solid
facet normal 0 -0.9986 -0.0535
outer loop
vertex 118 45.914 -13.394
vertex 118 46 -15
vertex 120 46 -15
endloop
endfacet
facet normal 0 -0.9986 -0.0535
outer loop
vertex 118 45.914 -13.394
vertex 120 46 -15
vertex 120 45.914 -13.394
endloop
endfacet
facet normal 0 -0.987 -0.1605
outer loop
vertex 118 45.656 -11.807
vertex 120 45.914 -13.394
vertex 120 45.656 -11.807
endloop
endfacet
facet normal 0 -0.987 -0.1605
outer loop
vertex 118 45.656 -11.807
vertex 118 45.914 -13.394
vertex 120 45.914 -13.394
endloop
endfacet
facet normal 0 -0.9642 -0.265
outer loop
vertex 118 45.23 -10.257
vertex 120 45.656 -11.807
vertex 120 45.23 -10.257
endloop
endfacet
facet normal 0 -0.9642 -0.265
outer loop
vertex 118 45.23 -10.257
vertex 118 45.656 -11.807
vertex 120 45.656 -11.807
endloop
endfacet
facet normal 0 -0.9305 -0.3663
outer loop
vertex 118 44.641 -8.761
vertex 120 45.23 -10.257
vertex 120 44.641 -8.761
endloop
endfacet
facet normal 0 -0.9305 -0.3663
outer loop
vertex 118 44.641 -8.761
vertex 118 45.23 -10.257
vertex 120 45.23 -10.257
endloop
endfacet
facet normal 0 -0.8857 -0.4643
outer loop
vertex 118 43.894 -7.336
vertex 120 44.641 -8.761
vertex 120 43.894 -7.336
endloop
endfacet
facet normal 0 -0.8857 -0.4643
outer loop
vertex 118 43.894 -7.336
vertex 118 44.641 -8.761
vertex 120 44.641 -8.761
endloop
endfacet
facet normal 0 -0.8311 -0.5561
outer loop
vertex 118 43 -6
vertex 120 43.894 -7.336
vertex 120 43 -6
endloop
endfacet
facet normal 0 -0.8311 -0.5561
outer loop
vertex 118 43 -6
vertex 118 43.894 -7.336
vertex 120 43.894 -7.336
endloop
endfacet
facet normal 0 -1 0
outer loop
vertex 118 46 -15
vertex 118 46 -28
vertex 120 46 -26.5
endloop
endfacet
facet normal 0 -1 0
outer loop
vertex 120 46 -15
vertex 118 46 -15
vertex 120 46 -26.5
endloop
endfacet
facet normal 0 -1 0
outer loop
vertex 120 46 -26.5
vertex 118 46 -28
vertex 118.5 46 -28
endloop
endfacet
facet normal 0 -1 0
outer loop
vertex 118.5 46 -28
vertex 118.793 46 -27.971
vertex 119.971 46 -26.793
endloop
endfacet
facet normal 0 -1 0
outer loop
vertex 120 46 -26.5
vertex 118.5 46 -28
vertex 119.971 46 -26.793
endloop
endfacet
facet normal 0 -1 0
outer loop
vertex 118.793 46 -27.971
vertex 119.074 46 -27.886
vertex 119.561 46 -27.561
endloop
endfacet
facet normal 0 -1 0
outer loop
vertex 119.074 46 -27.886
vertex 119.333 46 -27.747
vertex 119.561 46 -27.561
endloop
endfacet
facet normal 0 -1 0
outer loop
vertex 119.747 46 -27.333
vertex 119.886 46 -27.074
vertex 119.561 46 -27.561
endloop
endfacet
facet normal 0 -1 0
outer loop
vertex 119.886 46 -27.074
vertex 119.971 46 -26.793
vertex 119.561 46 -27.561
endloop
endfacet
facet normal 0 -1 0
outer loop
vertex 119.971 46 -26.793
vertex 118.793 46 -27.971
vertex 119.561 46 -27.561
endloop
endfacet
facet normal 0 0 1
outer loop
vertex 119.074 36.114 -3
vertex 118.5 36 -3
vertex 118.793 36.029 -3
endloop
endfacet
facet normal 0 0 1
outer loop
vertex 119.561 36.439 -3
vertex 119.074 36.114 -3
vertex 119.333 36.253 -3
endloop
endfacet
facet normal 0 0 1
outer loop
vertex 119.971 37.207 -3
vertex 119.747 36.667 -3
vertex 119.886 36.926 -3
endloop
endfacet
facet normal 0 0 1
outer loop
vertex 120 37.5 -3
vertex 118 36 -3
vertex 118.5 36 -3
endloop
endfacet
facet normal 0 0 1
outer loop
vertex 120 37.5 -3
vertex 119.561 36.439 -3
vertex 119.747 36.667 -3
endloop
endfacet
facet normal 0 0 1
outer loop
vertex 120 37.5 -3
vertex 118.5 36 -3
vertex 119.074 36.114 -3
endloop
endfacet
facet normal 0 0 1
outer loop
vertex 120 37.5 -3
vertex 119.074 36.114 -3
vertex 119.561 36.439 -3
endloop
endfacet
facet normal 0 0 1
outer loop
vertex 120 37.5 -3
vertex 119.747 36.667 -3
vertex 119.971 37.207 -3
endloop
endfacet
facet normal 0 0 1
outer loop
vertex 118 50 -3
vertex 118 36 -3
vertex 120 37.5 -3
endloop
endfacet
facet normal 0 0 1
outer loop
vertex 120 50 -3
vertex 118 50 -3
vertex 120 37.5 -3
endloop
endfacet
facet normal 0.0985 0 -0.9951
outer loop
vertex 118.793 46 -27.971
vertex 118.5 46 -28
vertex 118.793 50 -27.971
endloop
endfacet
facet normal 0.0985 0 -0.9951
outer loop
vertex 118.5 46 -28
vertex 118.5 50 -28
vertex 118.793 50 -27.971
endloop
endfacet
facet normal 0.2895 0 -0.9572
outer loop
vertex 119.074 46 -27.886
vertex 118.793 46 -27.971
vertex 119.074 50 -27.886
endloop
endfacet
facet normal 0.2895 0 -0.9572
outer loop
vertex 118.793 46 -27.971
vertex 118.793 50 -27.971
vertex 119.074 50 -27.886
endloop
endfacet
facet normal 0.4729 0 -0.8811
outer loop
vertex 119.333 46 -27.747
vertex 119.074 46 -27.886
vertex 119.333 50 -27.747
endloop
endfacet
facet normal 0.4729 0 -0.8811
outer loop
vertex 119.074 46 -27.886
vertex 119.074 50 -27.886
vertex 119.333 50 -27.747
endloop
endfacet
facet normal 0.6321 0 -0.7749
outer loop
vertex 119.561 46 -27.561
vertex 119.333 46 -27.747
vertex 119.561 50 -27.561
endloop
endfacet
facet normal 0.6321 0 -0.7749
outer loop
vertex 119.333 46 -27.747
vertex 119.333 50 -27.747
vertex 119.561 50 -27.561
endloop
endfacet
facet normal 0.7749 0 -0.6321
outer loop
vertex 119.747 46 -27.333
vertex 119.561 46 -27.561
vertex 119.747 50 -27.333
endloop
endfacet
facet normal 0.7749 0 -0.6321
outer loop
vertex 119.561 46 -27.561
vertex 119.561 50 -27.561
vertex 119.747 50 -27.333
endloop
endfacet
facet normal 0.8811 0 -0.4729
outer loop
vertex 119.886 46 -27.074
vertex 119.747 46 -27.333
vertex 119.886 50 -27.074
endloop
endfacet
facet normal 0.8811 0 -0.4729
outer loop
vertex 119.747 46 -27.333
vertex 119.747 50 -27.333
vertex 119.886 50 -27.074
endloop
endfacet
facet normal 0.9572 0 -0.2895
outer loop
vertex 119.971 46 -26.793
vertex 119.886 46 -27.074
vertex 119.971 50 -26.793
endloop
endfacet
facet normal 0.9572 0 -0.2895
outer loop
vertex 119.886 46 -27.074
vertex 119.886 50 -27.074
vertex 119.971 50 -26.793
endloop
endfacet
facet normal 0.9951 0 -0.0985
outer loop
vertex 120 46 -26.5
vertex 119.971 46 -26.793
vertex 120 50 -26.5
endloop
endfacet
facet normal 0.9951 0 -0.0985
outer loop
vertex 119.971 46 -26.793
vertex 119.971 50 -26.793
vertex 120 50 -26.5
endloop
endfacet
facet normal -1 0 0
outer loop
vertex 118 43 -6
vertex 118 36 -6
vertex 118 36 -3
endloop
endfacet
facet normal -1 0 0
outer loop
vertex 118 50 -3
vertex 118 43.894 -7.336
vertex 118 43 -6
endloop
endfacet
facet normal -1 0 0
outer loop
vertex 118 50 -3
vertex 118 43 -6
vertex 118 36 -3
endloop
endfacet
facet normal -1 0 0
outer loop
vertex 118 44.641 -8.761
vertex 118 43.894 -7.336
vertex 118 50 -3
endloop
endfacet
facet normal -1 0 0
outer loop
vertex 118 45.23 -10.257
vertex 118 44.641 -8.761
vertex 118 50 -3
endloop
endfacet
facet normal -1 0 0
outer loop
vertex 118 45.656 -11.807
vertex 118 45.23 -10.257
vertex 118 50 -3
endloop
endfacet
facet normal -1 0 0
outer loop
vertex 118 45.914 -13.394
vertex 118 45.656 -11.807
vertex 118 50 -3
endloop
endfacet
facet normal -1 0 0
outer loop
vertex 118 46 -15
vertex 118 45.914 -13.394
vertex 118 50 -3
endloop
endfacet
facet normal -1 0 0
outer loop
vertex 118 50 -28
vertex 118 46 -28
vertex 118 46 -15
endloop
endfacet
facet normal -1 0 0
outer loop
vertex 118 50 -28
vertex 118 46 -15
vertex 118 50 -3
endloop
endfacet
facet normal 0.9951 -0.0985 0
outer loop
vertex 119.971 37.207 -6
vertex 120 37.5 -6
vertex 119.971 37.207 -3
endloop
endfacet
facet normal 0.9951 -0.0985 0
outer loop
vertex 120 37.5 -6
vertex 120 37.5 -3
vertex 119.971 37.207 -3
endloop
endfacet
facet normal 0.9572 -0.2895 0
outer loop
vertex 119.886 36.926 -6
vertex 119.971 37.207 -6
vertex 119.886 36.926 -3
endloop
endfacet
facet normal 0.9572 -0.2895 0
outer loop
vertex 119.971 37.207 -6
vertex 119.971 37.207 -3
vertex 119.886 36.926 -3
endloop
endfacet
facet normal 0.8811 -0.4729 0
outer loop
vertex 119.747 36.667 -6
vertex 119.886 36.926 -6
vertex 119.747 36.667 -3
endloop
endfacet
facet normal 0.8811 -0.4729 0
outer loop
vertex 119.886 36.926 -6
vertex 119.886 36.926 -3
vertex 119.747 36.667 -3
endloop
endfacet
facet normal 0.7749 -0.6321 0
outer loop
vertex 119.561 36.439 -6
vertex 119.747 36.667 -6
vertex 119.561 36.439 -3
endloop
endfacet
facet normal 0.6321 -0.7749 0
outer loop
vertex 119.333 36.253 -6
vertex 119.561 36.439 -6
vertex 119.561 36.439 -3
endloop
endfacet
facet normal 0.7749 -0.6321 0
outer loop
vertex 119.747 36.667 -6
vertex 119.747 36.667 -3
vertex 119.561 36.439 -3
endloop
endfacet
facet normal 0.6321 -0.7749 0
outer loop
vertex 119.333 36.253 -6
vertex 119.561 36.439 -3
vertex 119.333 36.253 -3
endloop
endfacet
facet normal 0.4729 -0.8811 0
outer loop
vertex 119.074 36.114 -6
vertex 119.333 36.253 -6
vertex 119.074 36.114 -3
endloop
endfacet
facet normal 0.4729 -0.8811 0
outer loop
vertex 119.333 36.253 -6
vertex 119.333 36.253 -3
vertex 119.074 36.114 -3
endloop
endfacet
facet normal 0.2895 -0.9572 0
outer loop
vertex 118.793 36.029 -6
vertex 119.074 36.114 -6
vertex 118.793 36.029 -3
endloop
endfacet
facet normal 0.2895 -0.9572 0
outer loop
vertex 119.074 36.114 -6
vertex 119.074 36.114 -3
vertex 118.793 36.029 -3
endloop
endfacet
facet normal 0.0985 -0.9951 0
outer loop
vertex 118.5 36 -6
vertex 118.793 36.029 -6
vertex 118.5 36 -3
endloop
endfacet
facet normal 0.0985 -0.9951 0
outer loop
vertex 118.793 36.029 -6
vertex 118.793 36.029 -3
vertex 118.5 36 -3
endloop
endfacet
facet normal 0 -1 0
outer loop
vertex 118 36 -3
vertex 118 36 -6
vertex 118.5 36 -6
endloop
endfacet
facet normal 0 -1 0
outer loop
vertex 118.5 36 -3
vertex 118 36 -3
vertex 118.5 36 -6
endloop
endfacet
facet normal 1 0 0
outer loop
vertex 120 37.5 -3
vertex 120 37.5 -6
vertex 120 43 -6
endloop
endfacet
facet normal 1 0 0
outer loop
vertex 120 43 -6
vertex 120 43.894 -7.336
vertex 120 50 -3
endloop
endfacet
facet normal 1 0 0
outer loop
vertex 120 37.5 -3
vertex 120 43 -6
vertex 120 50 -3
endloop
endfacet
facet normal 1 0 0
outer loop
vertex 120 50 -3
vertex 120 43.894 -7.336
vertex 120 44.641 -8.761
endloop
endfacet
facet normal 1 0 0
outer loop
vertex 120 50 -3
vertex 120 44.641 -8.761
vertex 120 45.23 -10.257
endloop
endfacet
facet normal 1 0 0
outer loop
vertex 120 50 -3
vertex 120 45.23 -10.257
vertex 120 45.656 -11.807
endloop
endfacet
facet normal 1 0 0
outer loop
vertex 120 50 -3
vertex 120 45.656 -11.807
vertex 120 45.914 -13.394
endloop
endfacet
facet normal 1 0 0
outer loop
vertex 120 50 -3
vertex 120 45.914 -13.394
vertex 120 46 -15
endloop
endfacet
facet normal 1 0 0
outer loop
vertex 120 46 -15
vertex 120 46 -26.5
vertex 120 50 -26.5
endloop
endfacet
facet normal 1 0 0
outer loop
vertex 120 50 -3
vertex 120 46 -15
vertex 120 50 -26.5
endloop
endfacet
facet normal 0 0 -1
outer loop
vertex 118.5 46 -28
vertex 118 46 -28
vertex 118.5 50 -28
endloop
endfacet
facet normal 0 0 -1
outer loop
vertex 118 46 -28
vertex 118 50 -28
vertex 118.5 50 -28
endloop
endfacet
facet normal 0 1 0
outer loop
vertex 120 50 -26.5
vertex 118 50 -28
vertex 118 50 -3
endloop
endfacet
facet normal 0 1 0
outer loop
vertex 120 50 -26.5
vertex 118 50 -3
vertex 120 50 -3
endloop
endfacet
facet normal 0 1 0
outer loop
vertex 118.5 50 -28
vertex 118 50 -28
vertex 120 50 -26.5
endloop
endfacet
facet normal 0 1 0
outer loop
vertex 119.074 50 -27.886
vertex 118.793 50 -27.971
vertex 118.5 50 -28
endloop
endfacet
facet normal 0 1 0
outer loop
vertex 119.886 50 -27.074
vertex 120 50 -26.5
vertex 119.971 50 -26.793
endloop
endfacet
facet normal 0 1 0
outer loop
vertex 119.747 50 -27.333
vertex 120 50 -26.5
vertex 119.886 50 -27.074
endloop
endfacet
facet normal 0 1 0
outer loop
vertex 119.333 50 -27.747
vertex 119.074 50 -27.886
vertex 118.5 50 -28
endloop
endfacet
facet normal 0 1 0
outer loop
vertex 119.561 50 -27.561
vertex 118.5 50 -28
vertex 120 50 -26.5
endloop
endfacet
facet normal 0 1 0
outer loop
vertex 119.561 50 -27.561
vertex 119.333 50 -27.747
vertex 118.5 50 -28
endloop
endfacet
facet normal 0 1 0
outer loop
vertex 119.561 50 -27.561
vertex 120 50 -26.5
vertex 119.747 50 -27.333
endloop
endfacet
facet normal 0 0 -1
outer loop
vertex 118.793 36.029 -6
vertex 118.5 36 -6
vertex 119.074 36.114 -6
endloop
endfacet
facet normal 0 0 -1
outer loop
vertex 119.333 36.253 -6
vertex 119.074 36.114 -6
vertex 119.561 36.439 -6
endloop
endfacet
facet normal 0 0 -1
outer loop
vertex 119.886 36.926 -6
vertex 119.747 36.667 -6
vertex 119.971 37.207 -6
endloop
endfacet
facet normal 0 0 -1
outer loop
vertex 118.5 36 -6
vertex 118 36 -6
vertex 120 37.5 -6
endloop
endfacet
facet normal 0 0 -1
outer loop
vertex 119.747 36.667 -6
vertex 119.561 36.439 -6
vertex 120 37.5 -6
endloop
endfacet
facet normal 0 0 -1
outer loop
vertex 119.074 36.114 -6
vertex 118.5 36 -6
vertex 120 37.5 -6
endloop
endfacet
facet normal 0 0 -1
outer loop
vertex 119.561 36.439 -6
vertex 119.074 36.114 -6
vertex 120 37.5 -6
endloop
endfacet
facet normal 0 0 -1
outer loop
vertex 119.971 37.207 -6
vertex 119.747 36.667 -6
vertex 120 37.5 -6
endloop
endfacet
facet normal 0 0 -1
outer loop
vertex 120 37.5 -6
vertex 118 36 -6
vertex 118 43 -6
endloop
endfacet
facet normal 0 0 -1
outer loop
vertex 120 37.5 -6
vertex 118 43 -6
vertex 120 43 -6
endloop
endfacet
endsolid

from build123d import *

# Parameters (mm, degrees)
CYLINDER098_R     = 15
CYLINDER098_DEPTH = 4
BOX249_W          = 2
BOX249_H          = 10
BOX249_DEPTH      = 9
BOX250_W          = 2
BOX250_H          = 4
BOX250_DEPTH      = 13
BOX251_W          = 2
BOX251_H          = 14
BOX251_DEPTH      = 3
FILLET064_R       = 1.5


with BuildPart() as cylinder178:
    # Cylinder098 → Cylinder098 (new body)
    with BuildSketch(Plane(origin=(117, 31, -15), x_dir=(0, 0, -1), z_dir=(1, 0, 0))):
        Circle(CYLINDER098_R)
    extrude(amount=CYLINDER098_DEPTH)


with BuildPart() as cut130:
    # Box249 → Box249 (new body)
    with BuildSketch(Plane(origin=(118, 40, -15), x_dir=(1, 0, 0), z_dir=(0, 0, 1))):
        with Locations((1, 5)):
            Rectangle(BOX249_W, BOX249_H)
    extrude(amount=BOX249_DEPTH)

    # Cut130: cut Cylinder178
    add(cylinder178.part, mode=Mode.SUBTRACT)


with BuildPart() as cube238:
    # Box250 → Box250 (new body)
    with BuildSketch(Plane(origin=(118, 46, -28), x_dir=(1, 0, 0), z_dir=(0, 0, 1))):
        with Locations((1, 2)):
            Rectangle(BOX250_W, BOX250_H)
    extrude(amount=BOX250_DEPTH)


with BuildPart() as fillet064:
    # Box251 → Box251 (new body)
    with BuildSketch(Plane(origin=(118, 36, -6), x_dir=(1, 0, 0), z_dir=(0, 0, 1))):
        with Locations((1, 7)):
            Rectangle(BOX251_W, BOX251_H)
    extrude(amount=BOX251_DEPTH)

    # Fusion078: union Cut130, Cube238
    add(cut130.part)
    add(cube238.part)

    # Fillet064
    fillet064_edges = [fillet064.edges().sort_by_distance(p)[0] for p in [
        (120, 36, -4.5),
        (120, 48, -28),
    ]]
    fillet(fillet064_edges, radius=FILLET064_R)


solid = fillet064.part
